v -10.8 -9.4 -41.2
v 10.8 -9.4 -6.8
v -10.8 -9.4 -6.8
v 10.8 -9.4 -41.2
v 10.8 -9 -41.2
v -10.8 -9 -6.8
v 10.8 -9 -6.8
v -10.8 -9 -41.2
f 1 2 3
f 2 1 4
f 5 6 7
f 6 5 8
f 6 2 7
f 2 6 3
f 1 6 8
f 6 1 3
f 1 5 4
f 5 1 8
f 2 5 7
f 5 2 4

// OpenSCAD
// file: ../p/4-4edge.scad
use <../lib.scad>
$fa=1; $fs=0.2;
function ldraw_lib__4_4edge(realsolid=false) = [
// 0 Circle 1.0
// 0 Name: 4-4edge.dat
// 0 Author: James Jessiman
// 0 !LDRAW_ORG Primitive UPDATE 2017-01
// 0 !LICENSE Licensed under CC BY 2.0 and CC BY 4.0 : see CAreadme.txt
// 
// 0 BFC CERTIFY CCW
  [0,"BFC","CERTIFY"],
  [0,"BFC","CCW"],
// 
// 0 !HISTORY 1998-12-15 [PTadmin] Official Update 1998-10
// 0 !HISTORY 2005-12-28 [PTadmin] Official Update 2005-01
// 0 !HISTORY 2007-06-24 [PTadmin] Header formatted for Contributor Agreement
// 0 !HISTORY 2008-07-01 [PTadmin] Official Update 2008-01
// 0 !HISTORY 2017-01-15 [Steffen] BFCed
// 0 !HISTORY 2017-12-30 [PTadmin] Official Update 2017-01
// 
// 
// 2 24 1 0 0 0.9239 0 0.3827
  [2,24,1,0,0,0.9239,0,0.3827],
// 2 24 0.9239 0 0.3827 0.7071 0 0.7071
  [2,24,0.9239,0,0.3827,0.7071,0,0.7071],
// 2 24 0.7071 0 0.7071 0.3827 0 0.9239
  [2,24,0.7071,0,0.7071,0.3827,0,0.9239],
// 2 24 0.3827 0 0.9239 0 0 1
  [2,24,0.3827,0,0.9239,0,0,1],
// 2 24 0 0 1 -0.3827 0 0.9239
  [2,24,0,0,1,-0.3827,0,0.9239],
// 2 24 -0.3827 0 0.9239 -0.7071 0 0.7071
  [2,24,-0.3827,0,0.9239,-0.7071,0,0.7071],
// 2 24 -0.7071 0 0.7071 -0.9239 0 0.3827
  [2,24,-0.7071,0,0.7071,-0.9239,0,0.3827],
// 2 24 -0.9239 0 0.3827 -1 0 -0
  [2,24,-0.9239,0,0.3827,-1,0,-0],
// 2 24 -1 0 -0 -0.9239 0 -0.3827
  [2,24,-1,0,-0,-0.9239,0,-0.3827],
// 2 24 -0.9239 0 -0.3827 -0.7071 0 -0.7071
  [2,24,-0.9239,0,-0.3827,-0.7071,0,-0.7071],
// 2 24 -0.7071 0 -0.7071 -0.3827 0 -0.9239
  [2,24,-0.7071,0,-0.7071,-0.3827,0,-0.9239],
// 2 24 -0.3827 0 -0.9239 0 0 -1
  [2,24,-0.3827,0,-0.9239,0,0,-1],
// 2 24 0 0 -1 0.3827 0 -0.9239
  [2,24,0,0,-1,0.3827,0,-0.9239],
// 2 24 0.3827 0 -0.9239 0.7071 0 -0.7071
  [2,24,0.3827,0,-0.9239,0.7071,0,-0.7071],
// 2 24 0.7071 0 -0.7071 0.9239 0 -0.3827
  [2,24,0.7071,0,-0.7071,0.9239,0,-0.3827],
// 2 24 0.9239 0 -0.3827 1 0 0
  [2,24,0.9239,0,-0.3827,1,0,0],
];
module ldraw_lib__4_4edge(step=0, col=false, unit=2/5, alt=false, line=0.2, solid=!$preview)
    makepoly(ldraw_lib__4_4edge(solid), step=step, col=col, unit=unit, alt=alt, line=line, solid=solid);
ldraw_lib__4_4edge(line=0.2);
// file: ../p/4-4disc.scad
use <../lib.scad>
$fa=1; $fs=0.2;
function ldraw_lib__4_4disc(realsolid=false) = [
// 0 Disc 1.0
// 0 Name: 4-4disc.dat
// 0 Author: James Jessiman
// 0 !LDRAW_ORG Primitive UPDATE 2002-02
// 0 !LICENSE Licensed under CC BY 2.0 and CC BY 4.0 : see CAreadme.txt
// 
// 0 BFC CERTIFY CCW
  [0,"BFC","CERTIFY"],
  [0,"BFC","CCW"],
// 
// 0 !HISTORY 1998-12-15 [PTadmin] Official Update 1998-10
// 0 !HISTORY 2002-03-23 [sbliss] Added BFC statement
// 0 !HISTORY 2002-04-25 [PTadmin] Official Update 2002-02
// 0 !HISTORY 2007-06-24 [PTadmin] Header formatted for Contributor Agreement
// 0 !HISTORY 2008-07-01 [PTadmin] Official Update 2008-01
// 
// 
// 3 16 0 0 0 1 0 0 0.9239 0 0.3827
  [3,16,0,0,0,1,0,0,0.9239,0,0.3827],
// 3 16 0 0 0 0.9239 0 0.3827 0.7071 0 0.7071
  [3,16,0,0,0,0.9239,0,0.3827,0.7071,0,0.7071],
// 3 16 0 0 0 0.7071 0 0.7071 0.3827 0 0.9239
  [3,16,0,0,0,0.7071,0,0.7071,0.3827,0,0.9239],
// 3 16 0 0 0 0.3827 0 0.9239 0 0 1
  [3,16,0,0,0,0.3827,0,0.9239,0,0,1],
// 3 16 0 0 0 0 0 1 -0.3827 0 0.9239
  [3,16,0,0,0,0,0,1,-0.3827,0,0.9239],
// 3 16 0 0 0 -0.3827 0 0.9239 -0.7071 0 0.7071
  [3,16,0,0,0,-0.3827,0,0.9239,-0.7071,0,0.7071],
// 3 16 0 0 0 -0.7071 0 0.7071 -0.9239 0 0.3827
  [3,16,0,0,0,-0.7071,0,0.7071,-0.9239,0,0.3827],
// 3 16 0 0 0 -0.9239 0 0.3827 -1 0 -0
  [3,16,0,0,0,-0.9239,0,0.3827,-1,0,-0],
// 3 16 0 0 0 -1 0 -0 -0.9239 0 -0.3827
  [3,16,0,0,0,-1,0,-0,-0.9239,0,-0.3827],
// 3 16 0 0 0 -0.9239 0 -0.3827 -0.7071 0 -0.7071
  [3,16,0,0,0,-0.9239,0,-0.3827,-0.7071,0,-0.7071],
// 3 16 0 0 0 -0.7071 0 -0.7071 -0.3827 0 -0.9239
  [3,16,0,0,0,-0.7071,0,-0.7071,-0.3827,0,-0.9239],
// 3 16 0 0 0 -0.3827 0 -0.9239 0 0 -1
  [3,16,0,0,0,-0.3827,0,-0.9239,0,0,-1],
// 3 16 0 0 0 0 0 -1 0.3827 0 -0.9239
  [3,16,0,0,0,0,0,-1,0.3827,0,-0.9239],
// 3 16 0 0 0 0.3827 0 -0.9239 0.7071 0 -0.7071
  [3,16,0,0,0,0.3827,0,-0.9239,0.7071,0,-0.7071],
// 3 16 0 0 0 0.7071 0 -0.7071 0.9239 0 -0.3827
  [3,16,0,0,0,0.7071,0,-0.7071,0.9239,0,-0.3827],
// 3 16 0 0 0 0.9239 0 -0.3827 1 0 0
  [3,16,0,0,0,0.9239,0,-0.3827,1,0,0],
// 0
];
module ldraw_lib__4_4disc(step=0, col=false, unit=2/5, alt=false, line=0.2, solid=!$preview)
    makepoly(ldraw_lib__4_4disc(solid), step=step, col=col, unit=unit, alt=alt, line=line, solid=solid);
ldraw_lib__4_4disc(line=0.2);
// file: ../p/4-4cyli.scad
use <../lib.scad>
$fa=1; $fs=0.2;
function ldraw_lib__4_4cyli(realsolid=false) = [
// 0 Cylinder 1.0
// 0 Name: 4-4cyli.dat
// 0 Author: James Jessiman
// 0 !LDRAW_ORG Primitive UPDATE 2005-01
// 0 !LICENSE Licensed under CC BY 2.0 and CC BY 4.0 : see CAreadme.txt
// 
// 0 BFC CERTIFY CCW
  [0,"BFC","CERTIFY"],
  [0,"BFC","CCW"],
// 
// 0 !HISTORY 1998-12-15 [PTadmin] Official Update 1998-10
// 0 !HISTORY 2002-03-23 [sbliss] Added BFC statement; merged headers from files in distributions LDraw 0.27 and Complete.
// 0 !HISTORY 2002-04-25 [PTadmin] Official Update 2002-02
// 0 !HISTORY 2004-12-14 [guyvivan] BFC CCW
// 0 !HISTORY 2005-12-28 [PTadmin] Official Update 2005-01
// 0 !HISTORY 2007-06-24 [PTadmin] Header formatted for Contributor Agreement
// 0 !HISTORY 2008-07-01 [PTadmin] Official Update 2008-01
// 
// 
// 4 16 1 1 0 0.9239 1 0.3827 0.9239 0 0.3827 1 0 0
  [4,16,1,1,0,0.9239,1,0.3827,0.9239,0,0.3827,1,0,0],
// 5 24 1 0 0 1 1 0 0.9239 0 0.3827 0.9239 0 -0.3827
  [5,24,1,0,0,1,1,0,0.9239,0,0.3827,0.9239,0,-0.3827],
// 4 16 0.9239 1 0.3827 0.7071 1 0.7071 0.7071 0 0.7071 0.9239 0 0.3827
  [4,16,0.9239,1,0.3827,0.7071,1,0.7071,0.7071,0,0.7071,0.9239,0,0.3827],
// 5 24 0.9239 0 0.3827 0.9239 1 0.3827 0.7071 0 0.7071 1 0 0
  [5,24,0.9239,0,0.3827,0.9239,1,0.3827,0.7071,0,0.7071,1,0,0],
// 4 16 0.7071 1 0.7071 0.3827 1 0.9239 0.3827 0 0.9239 0.7071 0 0.7071
  [4,16,0.7071,1,0.7071,0.3827,1,0.9239,0.3827,0,0.9239,0.7071,0,0.7071],
// 5 24 0.7071 0 0.7071 0.7071 1 0.7071 0.3827 0 0.9239 0.9239 0 0.3827
  [5,24,0.7071,0,0.7071,0.7071,1,0.7071,0.3827,0,0.9239,0.9239,0,0.3827],
// 4 16 0.3827 1 0.9239 0 1 1 0 0 1 0.3827 0 0.9239
  [4,16,0.3827,1,0.9239,0,1,1,0,0,1,0.3827,0,0.9239],
// 5 24 0.3827 0 0.9239 0.3827 1 0.9239 0 0 1 0.7071 0 0.7071
  [5,24,0.3827,0,0.9239,0.3827,1,0.9239,0,0,1,0.7071,0,0.7071],
// 4 16 0 1 1 -0.3827 1 0.9239 -0.3827 0 0.9239 0 0 1
  [4,16,0,1,1,-0.3827,1,0.9239,-0.3827,0,0.9239,0,0,1],
// 5 24 0 0 1 0 1 1 -0.3827 0 0.9239 0.3827 0 0.9239
  [5,24,0,0,1,0,1,1,-0.3827,0,0.9239,0.3827,0,0.9239],
// 4 16 -0.3827 1 0.9239 -0.7071 1 0.7071 -0.7071 0 0.7071 -0.3827 0 0.9239
  [4,16,-0.3827,1,0.9239,-0.7071,1,0.7071,-0.7071,0,0.7071,-0.3827,0,0.9239],
// 5 24 -0.3827 0 0.9239 -0.3827 1 0.9239 -0.7071 0 0.7071 0 0 1
  [5,24,-0.3827,0,0.9239,-0.3827,1,0.9239,-0.7071,0,0.7071,0,0,1],
// 4 16 -0.7071 1 0.7071 -0.9239 1 0.3827 -0.9239 0 0.3827 -0.7071 0 0.7071
  [4,16,-0.7071,1,0.7071,-0.9239,1,0.3827,-0.9239,0,0.3827,-0.7071,0,0.7071],
// 5 24 -0.7071 0 0.7071 -0.7071 1 0.7071 -0.9239 0 0.3827 -0.3827 0 0.9239
  [5,24,-0.7071,0,0.7071,-0.7071,1,0.7071,-0.9239,0,0.3827,-0.3827,0,0.9239],
// 4 16 -0.9239 1 0.3827 -1 1 0 -1 0 0 -0.9239 0 0.3827
  [4,16,-0.9239,1,0.3827,-1,1,0,-1,0,0,-0.9239,0,0.3827],
// 5 24 -0.9239 0 0.3827 -0.9239 1 0.3827 -1 0 0 -0.7071 0 0.7071
  [5,24,-0.9239,0,0.3827,-0.9239,1,0.3827,-1,0,0,-0.7071,0,0.7071],
// 4 16 -1 1 0 -0.9239 1 -0.3827 -0.9239 0 -0.3827 -1 0 0
  [4,16,-1,1,0,-0.9239,1,-0.3827,-0.9239,0,-0.3827,-1,0,0],
// 5 24 -1 0 0 -1 1 0 -0.9239 0 -0.3827 -0.9239 0 0.3827
  [5,24,-1,0,0,-1,1,0,-0.9239,0,-0.3827,-0.9239,0,0.3827],
// 4 16 -0.9239 1 -0.3827 -0.7071 1 -0.7071 -0.7071 0 -0.7071 -0.9239 0 -0.3827
  [4,16,-0.9239,1,-0.3827,-0.7071,1,-0.7071,-0.7071,0,-0.7071,-0.9239,0,-0.3827],
// 5 24 -0.9239 0 -0.3827 -0.9239 1 -0.3827 -0.7071 0 -0.7071 -1 0 0
  [5,24,-0.9239,0,-0.3827,-0.9239,1,-0.3827,-0.7071,0,-0.7071,-1,0,0],
// 4 16 -0.7071 1 -0.7071 -0.3827 1 -0.9239 -0.3827 0 -0.9239 -0.7071 0 -0.7071
  [4,16,-0.7071,1,-0.7071,-0.3827,1,-0.9239,-0.3827,0,-0.9239,-0.7071,0,-0.7071],
// 5 24 -0.7071 0 -0.7071 -0.7071 1 -0.7071 -0.3827 0 -0.9239 -0.9239 0 -0.3827
  [5,24,-0.7071,0,-0.7071,-0.7071,1,-0.7071,-0.3827,0,-0.9239,-0.9239,0,-0.3827],
// 4 16 -0.3827 1 -0.9239 0 1 -1 0 0 -1 -0.3827 0 -0.9239
  [4,16,-0.3827,1,-0.9239,0,1,-1,0,0,-1,-0.3827,0,-0.9239],
// 5 24 -0.3827 0 -0.9239 -0.3827 1 -0.9239 0 0 -1 -0.7071 0 -0.7071
  [5,24,-0.3827,0,-0.9239,-0.3827,1,-0.9239,0,0,-1,-0.7071,0,-0.7071],
// 4 16 0 1 -1 0.3827 1 -0.9239 0.3827 0 -0.9239 0 0 -1
  [4,16,0,1,-1,0.3827,1,-0.9239,0.3827,0,-0.9239,0,0,-1],
// 5 24 0 0 -1 0 1 -1 0.3827 0 -0.9239 -0.3827 0 -0.9239
  [5,24,0,0,-1,0,1,-1,0.3827,0,-0.9239,-0.3827,0,-0.9239],
// 4 16 0.3827 1 -0.9239 0.7071 1 -0.7071 0.7071 0 -0.7071 0.3827 0 -0.9239
  [4,16,0.3827,1,-0.9239,0.7071,1,-0.7071,0.7071,0,-0.7071,0.3827,0,-0.9239],
// 5 24 0.3827 0 -0.9239 0.3827 1 -0.9239 0.7071 0 -0.7071 0 0 -1
  [5,24,0.3827,0,-0.9239,0.3827,1,-0.9239,0.7071,0,-0.7071,0,0,-1],
// 4 16 0.7071 1 -0.7071 0.9239 1 -0.3827 0.9239 0 -0.3827 0.7071 0 -0.7071
  [4,16,0.7071,1,-0.7071,0.9239,1,-0.3827,0.9239,0,-0.3827,0.7071,0,-0.7071],
// 5 24 0.7071 0 -0.7071 0.7071 1 -0.7071 0.9239 0 -0.3827 0.3827 0 -0.9239
  [5,24,0.7071,0,-0.7071,0.7071,1,-0.7071,0.9239,0,-0.3827,0.3827,0,-0.9239],
// 4 16 0.9239 1 -0.3827 1 1 0 1 0 0 0.9239 0 -0.3827
  [4,16,0.9239,1,-0.3827,1,1,0,1,0,0,0.9239,0,-0.3827],
// 5 24 0.9239 0 -0.3827 0.9239 1 -0.3827 1 0 0 0.7071 0 -0.7071
  [5,24,0.9239,0,-0.3827,0.9239,1,-0.3827,1,0,0,0.7071,0,-0.7071],
// 0
];
module ldraw_lib__4_4cyli(step=0, col=false, unit=2/5, alt=false, line=0.2, solid=!$preview)
    makepoly(ldraw_lib__4_4cyli(solid), step=step, col=col, unit=unit, alt=alt, line=line, solid=solid);
ldraw_lib__4_4cyli(line=0.2);
// file: ../p/stud3.scad
use <../lib.scad>
use <4-4cyli.scad>
use <4-4disc.scad>
use <4-4edge.scad>
$fa=1; $fs=0.2;
function ldraw_lib__stud3(realsolid=false) = realsolid ? 
    [openscad(translate([0,0,-eps()], o=cylinder(4+eps(), r=4)),2)] : [
// 0 Stud Tube Solid
// 0 Name: stud3.dat
// 0 Author: James Jessiman
// 0 !LDRAW_ORG Primitive UPDATE 2012-01
// 0 !LICENSE Licensed under CC BY 2.0 and CC BY 4.0 : see CAreadme.txt
// 
// 0 BFC CERTIFY CCW
  [0,"BFC","CERTIFY"],
  [0,"BFC","CCW"],
// 
// 0 !HISTORY 2002-04-04 [sbliss] Modified for BFC compliance
// 0 !HISTORY 2002-04-25 [PTadmin] Official Update 2002-02
// 0 !HISTORY 2007-06-24 [PTadmin] Header formatted for Contributor Agreement
// 0 !HISTORY 2008-07-01 [PTadmin] Official Update 2008-01
// 0 !HISTORY 2012-02-16 [Philo] Changed to CCW
// 0 !HISTORY 2012-03-30 [PTadmin] Official Update 2012-01
// 
// 
// 1 16 0 -4 0 4 0 0 0 1 0 0 0 4 4-4edge.dat
  [1,16,0,-4,0,4,0,0,0,1,0,0,0,4, ldraw_lib__4_4edge(realsolid)],
// 1 16 0 0 0 4 0 0 0 1 0 0 0 4 4-4edge.dat
  [1,16,0,0,0,4,0,0,0,1,0,0,0,4, ldraw_lib__4_4edge(realsolid)],
// 1 16 0 -4 0 4 0 0 0 1 0 0 0 4 4-4disc.dat
  [1,16,0,-4,0,4,0,0,0,1,0,0,0,4, ldraw_lib__4_4disc(realsolid)],
// 1 16 0 -4 0 4 0 0 0 4 0 0 0 4 4-4cyli.dat
  [1,16,0,-4,0,4,0,0,0,4,0,0,0,4, ldraw_lib__4_4cyli(realsolid)],
];
module ldraw_lib__stud3(step=0, col=false, unit=2/5, alt=false, line=0.2, solid=!$preview)
    makepoly(ldraw_lib__stud3(solid), step=step, col=col, unit=unit, alt=alt, line=line, solid=solid);
ldraw_lib__stud3(line=0.2);
// file: ../p/stud.scad
use <../lib.scad>
use <4-4cyli.scad>
use <4-4disc.scad>
use <4-4edge.scad>
$fa=1; $fs=0.2;
function ldraw_lib__stud(realsolid=false) = realsolid ? 
    [openscad(translate([0,0,-eps()], o=cylinder(4+eps(), r=6)),2)] : [
// 0 Stud
// 0 Name: stud.dat
// 0 Author: James Jessiman
// 0 !LDRAW_ORG Primitive UPDATE 2012-01
// 0 !LICENSE Licensed under CC BY 2.0 and CC BY 4.0 : see CAreadme.txt
// 
// 0 BFC CERTIFY CCW
  [0,"BFC","CERTIFY"],
  [0,"BFC","CCW"],
// 
// 0 !HISTORY 2002-04-04 [sbliss] Modified for BFC compliance
// 0 !HISTORY 2002-04-25 [PTadmin] Official Update 2002-02
// 0 !HISTORY 2007-06-24 [PTadmin] Header formatted for Contributor Agreement
// 0 !HISTORY 2008-07-01 [PTadmin] Official Update 2008-01
// 0 !HISTORY 2012-02-16 [Philo] Changed to CCW
// 0 !HISTORY 2012-03-30 [PTadmin] Official Update 2012-01
// 
// 
// 1 16 0 0 0 6 0 0 0 1 0 0 0 6 4-4edge.dat
  [1,16,0,0,0,6,0,0,0,1,0,0,0,6, ldraw_lib__4_4edge(realsolid)],
// 1 16 0 -4 0 6 0 0 0 1 0 0 0 6 4-4edge.dat
  [1,16,0,-4,0,6,0,0,0,1,0,0,0,6, ldraw_lib__4_4edge(realsolid)],
// 1 16 0 0 0 6 0 0 0 -4 0 0 0 6 4-4cyli.dat
  [1,16,0,0,0,6,0,0,0,-4,0,0,0,6, ldraw_lib__4_4cyli(realsolid)],
// 1 16 0 -4 0 6 0 0 0 1 0 0 0 6 4-4disc.dat
  [1,16,0,-4,0,6,0,0,0,1,0,0,0,6, ldraw_lib__4_4disc(realsolid)],
];
module ldraw_lib__stud(step=0, col=false, unit=2/5, alt=false, line=0.2, solid=!$preview)
    makepoly(ldraw_lib__stud(solid), step=step, col=col, unit=unit, alt=alt, line=line, solid=solid);
ldraw_lib__stud(line=0.2);
// file: ../p/box4t.scad
use <../lib.scad>
$fa=1; $fs=0.2;
function ldraw_lib__box4t(realsolid=false) = [
// 0 Box with 4 Adjacent Faces and All Edges
// 0 Name: box4t.dat
// 0 Author: Tore Eriksson [Tore_Eriksson]
// 0 !LDRAW_ORG Primitive UPDATE 2003-02
// 0 !LICENSE Licensed under CC BY 2.0 and CC BY 4.0 : see CAreadme.txt
// 
// 0 BFC CERTIFY CCW
  [0,"BFC","CERTIFY"],
  [0,"BFC","CCW"],
// 
// 0 !HISTORY 1997-09-29 [PTadmin] Official Update 1997-15
// 0 !HISTORY 2002-08-31 [izanette] Modified with WINDZ for BFC compliance
// 0 !HISTORY 2003-08-01 [PTadmin] Official Update 2003-02
// 0 !HISTORY 2007-06-24 [PTadmin] Header formatted for Contributor Agreement
// 0 !HISTORY 2008-07-01 [PTadmin] Official Update 2008-01
// 
// 
// 2 24 1 1 1 -1 1 1
  [2,24,1,1,1,-1,1,1],
// 2 24 -1 1 1 -1 1 -1
  [2,24,-1,1,1,-1,1,-1],
// 2 24 -1 1 -1 1 1 -1
  [2,24,-1,1,-1,1,1,-1],
// 2 24 1 1 -1 1 1 1
  [2,24,1,1,-1,1,1,1],
// 2 24 1 0 1 -1 0 1
  [2,24,1,0,1,-1,0,1],
// 2 24 -1 0 1 -1 0 -1
  [2,24,-1,0,1,-1,0,-1],
// 2 24 -1 0 -1 1 0 -1
  [2,24,-1,0,-1,1,0,-1],
// 2 24 1 0 -1 1 0 1
  [2,24,1,0,-1,1,0,1],
// 2 24 1 0 1 1 1 1
  [2,24,1,0,1,1,1,1],
// 2 24 -1 0 1 -1 1 1
  [2,24,-1,0,1,-1,1,1],
// 2 24 1 0 -1 1 1 -1
  [2,24,1,0,-1,1,1,-1],
// 2 24 -1 0 -1 -1 1 -1
  [2,24,-1,0,-1,-1,1,-1],
// 4 16 1 1 1 1 1 -1 -1 1 -1 -1 1 1
  [4,16,1,1,1,1,1,-1,-1,1,-1,-1,1,1],
// 4 16 1 1 1 -1 1 1 -1 0 1 1 0 1
  [4,16,1,1,1,-1,1,1,-1,0,1,1,0,1],
// 4 16 -1 1 1 -1 1 -1 -1 0 -1 -1 0 1
  [4,16,-1,1,1,-1,1,-1,-1,0,-1,-1,0,1],
// 0 4 16 -1 1 -1 -1 0 -1 1 0 -1 1 1 -1
// 4 16 1 1 -1 1 1 1 1 0 1 1 0 -1
  [4,16,1,1,-1,1,1,1,1,0,1,1,0,-1],
// 0
];
module ldraw_lib__box4t(step=0, col=false, unit=2/5, alt=false, line=0.2, solid=!$preview)
    makepoly(ldraw_lib__box4t(solid), step=step, col=col, unit=unit, alt=alt, line=line, solid=solid);
ldraw_lib__box4t(line=0.2);
// file: s/3004s01.scad
use <../../lib.scad>
use <../../p/box4t.scad>
use <../../p/box5.scad>
use <../../p/stud.scad>
use <../../p/stud3.scad>
$fa=1; $fs=0.2;
function ldraw_lib__s__3004s01(realsolid=false) = [
// 0 ~Brick  1 x  2 without Front Face
// 0 Name: s\3004s01.dat
// 0 Author: James Jessiman
// 0 !LDRAW_ORG Subpart UPDATE 2003-03
// 0 !LICENSE Licensed under CC BY 2.0 and CC BY 4.0 : see CAreadme.txt
// 
// 0 BFC CERTIFY CCW
  [0,"BFC","CERTIFY"],
  [0,"BFC","CCW"],
// 
// 0 !HISTORY 2003-09-07 [jriley] Subfiling, BFC
// 0 !HISTORY 2003-12-19 [PTadmin] Official Update 2003-03
// 0 !HISTORY 2007-08-29 [PTadmin] Header formatted for Contributor Agreement
// 0 !HISTORY 2008-07-01 [PTadmin] Official Update 2008-01
// 
// 
// 1 16 0 4 0 1 0 0 0 -5 0 0 0 1 stud3.dat
  [1,16,0,4,0,1,0,0,0,-5,0,0,0,1, ldraw_lib__stud3(realsolid)],
// 0 BFC INVERTNEXT
  [0,"BFC","INVERTNEXT"],
// 1 16 0 24 0 16 0 0 0 -20 0 0 0 6 box5.dat
  [1,16,0,24,0,16,0,0,0,-20,0,0,0,6, ldraw_lib__box5(realsolid)],
// 4 16 20 24 10 16 24 6 -16 24 6 -20 24 10
  [4,16,20,24,10,16,24,6,-16,24,6,-20,24,10],
// 4 16 -20 24 10 -16 24 6 -16 24 -6 -20 24 -10
  [4,16,-20,24,10,-16,24,6,-16,24,-6,-20,24,-10],
// 4 16 -20 24 -10 -16 24 -6 16 24 -6 20 24 -10
  [4,16,-20,24,-10,-16,24,-6,16,24,-6,20,24,-10],
// 4 16 20 24 -10 16 24 -6 16 24 6 20 24 10
  [4,16,20,24,-10,16,24,-6,16,24,6,20,24,10],
// 1 16 0 24 0 20 0 0 0 -24 0 0 0 10 box4t.dat
  [1,16,0,24,0,20,0,0,0,-24,0,0,0,10, ldraw_lib__box4t(realsolid)],
// 1 16 10 0 0 1 0 0 0 1 0 0 0 1 stud.dat
  [1,16,10,0,0,1,0,0,0,1,0,0,0,1, ldraw_lib__stud(realsolid)],
// 1 16 -10 0 0 1 0 0 0 1 0 0 0 1 stud.dat
  [1,16,-10,0,0,1,0,0,0,1,0,0,0,1, ldraw_lib__stud(realsolid)],
// 0
];
module ldraw_lib__s__3004s01(step=0, col=false, unit=2/5, alt=false, line=0.2, solid=!$preview)
    makepoly(ldraw_lib__s__3004s01(solid), step=step, col=col, unit=unit, alt=alt, line=line, solid=solid);
ldraw_lib__s__3004s01(line=0.2);
// file: 3004.scad
use <../lib.scad>
use <s/3004s01.scad>
$fa=1; $fs=0.2;
function ldraw_lib__3004(realsolid=false) = [
// 0 Brick  1 x  2
// 0 Name: 3004.dat
// 0 Author: James Jessiman
// 0 !LDRAW_ORG Part UPDATE 2022-05
// 0 !LICENSE Licensed under CC BY 2.0 and CC BY 4.0 : see CAreadme.txt
// 
// 0 BFC CERTIFY CCW
  [0,"BFC","CERTIFY"],
  [0,"BFC","CCW"],
// 
// 0 !HISTORY 2001-10-26 [PTadmin] Official Update 2001-01
// 0 !HISTORY 2002-05-07 {unknown} BFC Certification
// 0 !HISTORY 2002-06-11 [PTadmin] Official Update 2002-03
// 0 !HISTORY 2007-05-07 [PTadmin] Header formatted for Contributor Agreement
// 0 !HISTORY 2008-07-01 [PTadmin] Official Update 2008-01
// 0 !HISTORY 2022-08-04 [MagFors] Using subfile
// 0 !HISTORY 2022-09-15 [PTadmin] Official Update 2022-05
// 
// 
// 1 16 0 0 0 1 0 0 0 1 0 0 0 1 s\3004s01.dat
  [1,16,0,0,0,1,0,0,0,1,0,0,0,1, ldraw_lib__s__3004s01(realsolid)],
// 4 16 -20 24 -10 20 24 -10 20 0 -10 -20 0 -10
  [4,16,-20,24,-10,20,24,-10,20,0,-10,-20,0,-10],
];
module ldraw_lib__3004(step=0, col=false, unit=2/5, alt=false, line=0.2, solid=!$preview)
    makepoly(ldraw_lib__3004(solid), step=step, col=col, unit=unit, alt=alt, line=line, solid=solid);
ldraw_lib__3004(line=0.2);
// file: ../p/box5.scad
use <../lib.scad>
$fa=1; $fs=0.2;
function ldraw_lib__box5(realsolid=false) = [
// 0 Box with 5 Faces and All Edges
// 0 Name: box5.dat
// 0 Author: James Jessiman
// 0 !LDRAW_ORG Primitive UPDATE 2012-01
// 0 !LICENSE Licensed under CC BY 2.0 and CC BY 4.0 : see CAreadme.txt
// 
// 0 BFC CERTIFY CCW
  [0,"BFC","CERTIFY"],
  [0,"BFC","CCW"],
// 
// 0 !HISTORY 2002-04-03 [sbliss] Modified for BFC compliance
// 0 !HISTORY 2002-04-25 [PTadmin] Official Update 2002-02
// 0 !HISTORY 2007-06-24 [PTadmin] Header formatted for Contributor Agreement
// 0 !HISTORY 2008-07-01 [PTadmin] Official Update 2008-01
// 0 !HISTORY 2012-02-16 [Philo] Changed to CCW
// 0 !HISTORY 2012-03-30 [PTadmin] Official Update 2012-01
// 
// 
// 2 24 1 1 1 -1 1 1
  [2,24,1,1,1,-1,1,1],
// 2 24 -1 1 1 -1 1 -1
  [2,24,-1,1,1,-1,1,-1],
// 2 24 -1 1 -1 1 1 -1
  [2,24,-1,1,-1,1,1,-1],
// 2 24 1 1 -1 1 1 1
  [2,24,1,1,-1,1,1,1],
// 2 24 1 0 1 -1 0 1
  [2,24,1,0,1,-1,0,1],
// 2 24 -1 0 1 -1 0 -1
  [2,24,-1,0,1,-1,0,-1],
// 2 24 -1 0 -1 1 0 -1
  [2,24,-1,0,-1,1,0,-1],
// 2 24 1 0 -1 1 0 1
  [2,24,1,0,-1,1,0,1],
// 2 24 1 0 1 1 1 1
  [2,24,1,0,1,1,1,1],
// 2 24 -1 0 1 -1 1 1
  [2,24,-1,0,1,-1,1,1],
// 2 24 1 0 -1 1 1 -1
  [2,24,1,0,-1,1,1,-1],
// 2 24 -1 0 -1 -1 1 -1
  [2,24,-1,0,-1,-1,1,-1],
// 4 16 -1 1 1 1 1 1 1 1 -1 -1 1 -1
  [4,16,-1,1,1,1,1,1,1,1,-1,-1,1,-1],
// 4 16 -1 1 1 -1 0 1 1 0 1 1 1 1
  [4,16,-1,1,1,-1,0,1,1,0,1,1,1,1],
// 4 16 -1 1 -1 -1 0 -1 -1 0 1 -1 1 1
  [4,16,-1,1,-1,-1,0,-1,-1,0,1,-1,1,1],
// 4 16 1 1 -1 1 0 -1 -1 0 -1 -1 1 -1
  [4,16,1,1,-1,1,0,-1,-1,0,-1,-1,1,-1],
// 4 16 1 1 1 1 0 1 1 0 -1 1 1 -1
  [4,16,1,1,1,1,0,1,1,0,-1,1,1,-1],
];
module ldraw_lib__box5(step=0, col=false, unit=2/5, alt=false, line=0.2, solid=!$preview)
    makepoly(ldraw_lib__box5(solid), step=step, col=col, unit=unit, alt=alt, line=line, solid=solid);
ldraw_lib__box5(line=0.2);
// main file
use <../lib.scad>
use <../p/box5.scad>
$fa=1; $fs=0.2;
function ldraw_lib__u9117(realsolid=false) = [
// 0 ~Electric Hub Mario Body Screen
// 0 Name: u9117.dat
// 0 Author: Philippe Hurbain [Philo]
// 0 !LDRAW_ORG Part UPDATE 2023-01
// 0 !LICENSE Licensed under CC BY 2.0 and CC BY 4.0 : see CAreadme.txt
// 
// 0 BFC CERTIFY CCW
  [0,"BFC","CERTIFY"],
  [0,"BFC","CCW"],
// 
// 0 !HISTORY 2023-03-05 [OrionP] Official Update 2023-01
// 
// 
// 4 16 27 17 -23.5 -27 17 -23.5 -27 103 -23.5 27 103 -23.5
  [4,16,27,17,-23.5,-27,17,-23.5,-27,103,-23.5,27,103,-23.5],
// 1 16 0 60 -23.5 27 0 0 0 0 -43 0 1 0 box5.dat
  [1,16,0,60,-23.5,27,0,0,0,0,-43,0,1,0, ldraw_lib__box5(realsolid)],
];
module ldraw_lib__u9117(step=0, col=false, unit=2/5, alt=false, line=0.2, solid=!$preview)
    makepoly(ldraw_lib__u9117(solid), step=step, col=col, unit=unit, alt=alt, line=line, solid=solid);
ldraw_lib__u9117(line=0.2);
